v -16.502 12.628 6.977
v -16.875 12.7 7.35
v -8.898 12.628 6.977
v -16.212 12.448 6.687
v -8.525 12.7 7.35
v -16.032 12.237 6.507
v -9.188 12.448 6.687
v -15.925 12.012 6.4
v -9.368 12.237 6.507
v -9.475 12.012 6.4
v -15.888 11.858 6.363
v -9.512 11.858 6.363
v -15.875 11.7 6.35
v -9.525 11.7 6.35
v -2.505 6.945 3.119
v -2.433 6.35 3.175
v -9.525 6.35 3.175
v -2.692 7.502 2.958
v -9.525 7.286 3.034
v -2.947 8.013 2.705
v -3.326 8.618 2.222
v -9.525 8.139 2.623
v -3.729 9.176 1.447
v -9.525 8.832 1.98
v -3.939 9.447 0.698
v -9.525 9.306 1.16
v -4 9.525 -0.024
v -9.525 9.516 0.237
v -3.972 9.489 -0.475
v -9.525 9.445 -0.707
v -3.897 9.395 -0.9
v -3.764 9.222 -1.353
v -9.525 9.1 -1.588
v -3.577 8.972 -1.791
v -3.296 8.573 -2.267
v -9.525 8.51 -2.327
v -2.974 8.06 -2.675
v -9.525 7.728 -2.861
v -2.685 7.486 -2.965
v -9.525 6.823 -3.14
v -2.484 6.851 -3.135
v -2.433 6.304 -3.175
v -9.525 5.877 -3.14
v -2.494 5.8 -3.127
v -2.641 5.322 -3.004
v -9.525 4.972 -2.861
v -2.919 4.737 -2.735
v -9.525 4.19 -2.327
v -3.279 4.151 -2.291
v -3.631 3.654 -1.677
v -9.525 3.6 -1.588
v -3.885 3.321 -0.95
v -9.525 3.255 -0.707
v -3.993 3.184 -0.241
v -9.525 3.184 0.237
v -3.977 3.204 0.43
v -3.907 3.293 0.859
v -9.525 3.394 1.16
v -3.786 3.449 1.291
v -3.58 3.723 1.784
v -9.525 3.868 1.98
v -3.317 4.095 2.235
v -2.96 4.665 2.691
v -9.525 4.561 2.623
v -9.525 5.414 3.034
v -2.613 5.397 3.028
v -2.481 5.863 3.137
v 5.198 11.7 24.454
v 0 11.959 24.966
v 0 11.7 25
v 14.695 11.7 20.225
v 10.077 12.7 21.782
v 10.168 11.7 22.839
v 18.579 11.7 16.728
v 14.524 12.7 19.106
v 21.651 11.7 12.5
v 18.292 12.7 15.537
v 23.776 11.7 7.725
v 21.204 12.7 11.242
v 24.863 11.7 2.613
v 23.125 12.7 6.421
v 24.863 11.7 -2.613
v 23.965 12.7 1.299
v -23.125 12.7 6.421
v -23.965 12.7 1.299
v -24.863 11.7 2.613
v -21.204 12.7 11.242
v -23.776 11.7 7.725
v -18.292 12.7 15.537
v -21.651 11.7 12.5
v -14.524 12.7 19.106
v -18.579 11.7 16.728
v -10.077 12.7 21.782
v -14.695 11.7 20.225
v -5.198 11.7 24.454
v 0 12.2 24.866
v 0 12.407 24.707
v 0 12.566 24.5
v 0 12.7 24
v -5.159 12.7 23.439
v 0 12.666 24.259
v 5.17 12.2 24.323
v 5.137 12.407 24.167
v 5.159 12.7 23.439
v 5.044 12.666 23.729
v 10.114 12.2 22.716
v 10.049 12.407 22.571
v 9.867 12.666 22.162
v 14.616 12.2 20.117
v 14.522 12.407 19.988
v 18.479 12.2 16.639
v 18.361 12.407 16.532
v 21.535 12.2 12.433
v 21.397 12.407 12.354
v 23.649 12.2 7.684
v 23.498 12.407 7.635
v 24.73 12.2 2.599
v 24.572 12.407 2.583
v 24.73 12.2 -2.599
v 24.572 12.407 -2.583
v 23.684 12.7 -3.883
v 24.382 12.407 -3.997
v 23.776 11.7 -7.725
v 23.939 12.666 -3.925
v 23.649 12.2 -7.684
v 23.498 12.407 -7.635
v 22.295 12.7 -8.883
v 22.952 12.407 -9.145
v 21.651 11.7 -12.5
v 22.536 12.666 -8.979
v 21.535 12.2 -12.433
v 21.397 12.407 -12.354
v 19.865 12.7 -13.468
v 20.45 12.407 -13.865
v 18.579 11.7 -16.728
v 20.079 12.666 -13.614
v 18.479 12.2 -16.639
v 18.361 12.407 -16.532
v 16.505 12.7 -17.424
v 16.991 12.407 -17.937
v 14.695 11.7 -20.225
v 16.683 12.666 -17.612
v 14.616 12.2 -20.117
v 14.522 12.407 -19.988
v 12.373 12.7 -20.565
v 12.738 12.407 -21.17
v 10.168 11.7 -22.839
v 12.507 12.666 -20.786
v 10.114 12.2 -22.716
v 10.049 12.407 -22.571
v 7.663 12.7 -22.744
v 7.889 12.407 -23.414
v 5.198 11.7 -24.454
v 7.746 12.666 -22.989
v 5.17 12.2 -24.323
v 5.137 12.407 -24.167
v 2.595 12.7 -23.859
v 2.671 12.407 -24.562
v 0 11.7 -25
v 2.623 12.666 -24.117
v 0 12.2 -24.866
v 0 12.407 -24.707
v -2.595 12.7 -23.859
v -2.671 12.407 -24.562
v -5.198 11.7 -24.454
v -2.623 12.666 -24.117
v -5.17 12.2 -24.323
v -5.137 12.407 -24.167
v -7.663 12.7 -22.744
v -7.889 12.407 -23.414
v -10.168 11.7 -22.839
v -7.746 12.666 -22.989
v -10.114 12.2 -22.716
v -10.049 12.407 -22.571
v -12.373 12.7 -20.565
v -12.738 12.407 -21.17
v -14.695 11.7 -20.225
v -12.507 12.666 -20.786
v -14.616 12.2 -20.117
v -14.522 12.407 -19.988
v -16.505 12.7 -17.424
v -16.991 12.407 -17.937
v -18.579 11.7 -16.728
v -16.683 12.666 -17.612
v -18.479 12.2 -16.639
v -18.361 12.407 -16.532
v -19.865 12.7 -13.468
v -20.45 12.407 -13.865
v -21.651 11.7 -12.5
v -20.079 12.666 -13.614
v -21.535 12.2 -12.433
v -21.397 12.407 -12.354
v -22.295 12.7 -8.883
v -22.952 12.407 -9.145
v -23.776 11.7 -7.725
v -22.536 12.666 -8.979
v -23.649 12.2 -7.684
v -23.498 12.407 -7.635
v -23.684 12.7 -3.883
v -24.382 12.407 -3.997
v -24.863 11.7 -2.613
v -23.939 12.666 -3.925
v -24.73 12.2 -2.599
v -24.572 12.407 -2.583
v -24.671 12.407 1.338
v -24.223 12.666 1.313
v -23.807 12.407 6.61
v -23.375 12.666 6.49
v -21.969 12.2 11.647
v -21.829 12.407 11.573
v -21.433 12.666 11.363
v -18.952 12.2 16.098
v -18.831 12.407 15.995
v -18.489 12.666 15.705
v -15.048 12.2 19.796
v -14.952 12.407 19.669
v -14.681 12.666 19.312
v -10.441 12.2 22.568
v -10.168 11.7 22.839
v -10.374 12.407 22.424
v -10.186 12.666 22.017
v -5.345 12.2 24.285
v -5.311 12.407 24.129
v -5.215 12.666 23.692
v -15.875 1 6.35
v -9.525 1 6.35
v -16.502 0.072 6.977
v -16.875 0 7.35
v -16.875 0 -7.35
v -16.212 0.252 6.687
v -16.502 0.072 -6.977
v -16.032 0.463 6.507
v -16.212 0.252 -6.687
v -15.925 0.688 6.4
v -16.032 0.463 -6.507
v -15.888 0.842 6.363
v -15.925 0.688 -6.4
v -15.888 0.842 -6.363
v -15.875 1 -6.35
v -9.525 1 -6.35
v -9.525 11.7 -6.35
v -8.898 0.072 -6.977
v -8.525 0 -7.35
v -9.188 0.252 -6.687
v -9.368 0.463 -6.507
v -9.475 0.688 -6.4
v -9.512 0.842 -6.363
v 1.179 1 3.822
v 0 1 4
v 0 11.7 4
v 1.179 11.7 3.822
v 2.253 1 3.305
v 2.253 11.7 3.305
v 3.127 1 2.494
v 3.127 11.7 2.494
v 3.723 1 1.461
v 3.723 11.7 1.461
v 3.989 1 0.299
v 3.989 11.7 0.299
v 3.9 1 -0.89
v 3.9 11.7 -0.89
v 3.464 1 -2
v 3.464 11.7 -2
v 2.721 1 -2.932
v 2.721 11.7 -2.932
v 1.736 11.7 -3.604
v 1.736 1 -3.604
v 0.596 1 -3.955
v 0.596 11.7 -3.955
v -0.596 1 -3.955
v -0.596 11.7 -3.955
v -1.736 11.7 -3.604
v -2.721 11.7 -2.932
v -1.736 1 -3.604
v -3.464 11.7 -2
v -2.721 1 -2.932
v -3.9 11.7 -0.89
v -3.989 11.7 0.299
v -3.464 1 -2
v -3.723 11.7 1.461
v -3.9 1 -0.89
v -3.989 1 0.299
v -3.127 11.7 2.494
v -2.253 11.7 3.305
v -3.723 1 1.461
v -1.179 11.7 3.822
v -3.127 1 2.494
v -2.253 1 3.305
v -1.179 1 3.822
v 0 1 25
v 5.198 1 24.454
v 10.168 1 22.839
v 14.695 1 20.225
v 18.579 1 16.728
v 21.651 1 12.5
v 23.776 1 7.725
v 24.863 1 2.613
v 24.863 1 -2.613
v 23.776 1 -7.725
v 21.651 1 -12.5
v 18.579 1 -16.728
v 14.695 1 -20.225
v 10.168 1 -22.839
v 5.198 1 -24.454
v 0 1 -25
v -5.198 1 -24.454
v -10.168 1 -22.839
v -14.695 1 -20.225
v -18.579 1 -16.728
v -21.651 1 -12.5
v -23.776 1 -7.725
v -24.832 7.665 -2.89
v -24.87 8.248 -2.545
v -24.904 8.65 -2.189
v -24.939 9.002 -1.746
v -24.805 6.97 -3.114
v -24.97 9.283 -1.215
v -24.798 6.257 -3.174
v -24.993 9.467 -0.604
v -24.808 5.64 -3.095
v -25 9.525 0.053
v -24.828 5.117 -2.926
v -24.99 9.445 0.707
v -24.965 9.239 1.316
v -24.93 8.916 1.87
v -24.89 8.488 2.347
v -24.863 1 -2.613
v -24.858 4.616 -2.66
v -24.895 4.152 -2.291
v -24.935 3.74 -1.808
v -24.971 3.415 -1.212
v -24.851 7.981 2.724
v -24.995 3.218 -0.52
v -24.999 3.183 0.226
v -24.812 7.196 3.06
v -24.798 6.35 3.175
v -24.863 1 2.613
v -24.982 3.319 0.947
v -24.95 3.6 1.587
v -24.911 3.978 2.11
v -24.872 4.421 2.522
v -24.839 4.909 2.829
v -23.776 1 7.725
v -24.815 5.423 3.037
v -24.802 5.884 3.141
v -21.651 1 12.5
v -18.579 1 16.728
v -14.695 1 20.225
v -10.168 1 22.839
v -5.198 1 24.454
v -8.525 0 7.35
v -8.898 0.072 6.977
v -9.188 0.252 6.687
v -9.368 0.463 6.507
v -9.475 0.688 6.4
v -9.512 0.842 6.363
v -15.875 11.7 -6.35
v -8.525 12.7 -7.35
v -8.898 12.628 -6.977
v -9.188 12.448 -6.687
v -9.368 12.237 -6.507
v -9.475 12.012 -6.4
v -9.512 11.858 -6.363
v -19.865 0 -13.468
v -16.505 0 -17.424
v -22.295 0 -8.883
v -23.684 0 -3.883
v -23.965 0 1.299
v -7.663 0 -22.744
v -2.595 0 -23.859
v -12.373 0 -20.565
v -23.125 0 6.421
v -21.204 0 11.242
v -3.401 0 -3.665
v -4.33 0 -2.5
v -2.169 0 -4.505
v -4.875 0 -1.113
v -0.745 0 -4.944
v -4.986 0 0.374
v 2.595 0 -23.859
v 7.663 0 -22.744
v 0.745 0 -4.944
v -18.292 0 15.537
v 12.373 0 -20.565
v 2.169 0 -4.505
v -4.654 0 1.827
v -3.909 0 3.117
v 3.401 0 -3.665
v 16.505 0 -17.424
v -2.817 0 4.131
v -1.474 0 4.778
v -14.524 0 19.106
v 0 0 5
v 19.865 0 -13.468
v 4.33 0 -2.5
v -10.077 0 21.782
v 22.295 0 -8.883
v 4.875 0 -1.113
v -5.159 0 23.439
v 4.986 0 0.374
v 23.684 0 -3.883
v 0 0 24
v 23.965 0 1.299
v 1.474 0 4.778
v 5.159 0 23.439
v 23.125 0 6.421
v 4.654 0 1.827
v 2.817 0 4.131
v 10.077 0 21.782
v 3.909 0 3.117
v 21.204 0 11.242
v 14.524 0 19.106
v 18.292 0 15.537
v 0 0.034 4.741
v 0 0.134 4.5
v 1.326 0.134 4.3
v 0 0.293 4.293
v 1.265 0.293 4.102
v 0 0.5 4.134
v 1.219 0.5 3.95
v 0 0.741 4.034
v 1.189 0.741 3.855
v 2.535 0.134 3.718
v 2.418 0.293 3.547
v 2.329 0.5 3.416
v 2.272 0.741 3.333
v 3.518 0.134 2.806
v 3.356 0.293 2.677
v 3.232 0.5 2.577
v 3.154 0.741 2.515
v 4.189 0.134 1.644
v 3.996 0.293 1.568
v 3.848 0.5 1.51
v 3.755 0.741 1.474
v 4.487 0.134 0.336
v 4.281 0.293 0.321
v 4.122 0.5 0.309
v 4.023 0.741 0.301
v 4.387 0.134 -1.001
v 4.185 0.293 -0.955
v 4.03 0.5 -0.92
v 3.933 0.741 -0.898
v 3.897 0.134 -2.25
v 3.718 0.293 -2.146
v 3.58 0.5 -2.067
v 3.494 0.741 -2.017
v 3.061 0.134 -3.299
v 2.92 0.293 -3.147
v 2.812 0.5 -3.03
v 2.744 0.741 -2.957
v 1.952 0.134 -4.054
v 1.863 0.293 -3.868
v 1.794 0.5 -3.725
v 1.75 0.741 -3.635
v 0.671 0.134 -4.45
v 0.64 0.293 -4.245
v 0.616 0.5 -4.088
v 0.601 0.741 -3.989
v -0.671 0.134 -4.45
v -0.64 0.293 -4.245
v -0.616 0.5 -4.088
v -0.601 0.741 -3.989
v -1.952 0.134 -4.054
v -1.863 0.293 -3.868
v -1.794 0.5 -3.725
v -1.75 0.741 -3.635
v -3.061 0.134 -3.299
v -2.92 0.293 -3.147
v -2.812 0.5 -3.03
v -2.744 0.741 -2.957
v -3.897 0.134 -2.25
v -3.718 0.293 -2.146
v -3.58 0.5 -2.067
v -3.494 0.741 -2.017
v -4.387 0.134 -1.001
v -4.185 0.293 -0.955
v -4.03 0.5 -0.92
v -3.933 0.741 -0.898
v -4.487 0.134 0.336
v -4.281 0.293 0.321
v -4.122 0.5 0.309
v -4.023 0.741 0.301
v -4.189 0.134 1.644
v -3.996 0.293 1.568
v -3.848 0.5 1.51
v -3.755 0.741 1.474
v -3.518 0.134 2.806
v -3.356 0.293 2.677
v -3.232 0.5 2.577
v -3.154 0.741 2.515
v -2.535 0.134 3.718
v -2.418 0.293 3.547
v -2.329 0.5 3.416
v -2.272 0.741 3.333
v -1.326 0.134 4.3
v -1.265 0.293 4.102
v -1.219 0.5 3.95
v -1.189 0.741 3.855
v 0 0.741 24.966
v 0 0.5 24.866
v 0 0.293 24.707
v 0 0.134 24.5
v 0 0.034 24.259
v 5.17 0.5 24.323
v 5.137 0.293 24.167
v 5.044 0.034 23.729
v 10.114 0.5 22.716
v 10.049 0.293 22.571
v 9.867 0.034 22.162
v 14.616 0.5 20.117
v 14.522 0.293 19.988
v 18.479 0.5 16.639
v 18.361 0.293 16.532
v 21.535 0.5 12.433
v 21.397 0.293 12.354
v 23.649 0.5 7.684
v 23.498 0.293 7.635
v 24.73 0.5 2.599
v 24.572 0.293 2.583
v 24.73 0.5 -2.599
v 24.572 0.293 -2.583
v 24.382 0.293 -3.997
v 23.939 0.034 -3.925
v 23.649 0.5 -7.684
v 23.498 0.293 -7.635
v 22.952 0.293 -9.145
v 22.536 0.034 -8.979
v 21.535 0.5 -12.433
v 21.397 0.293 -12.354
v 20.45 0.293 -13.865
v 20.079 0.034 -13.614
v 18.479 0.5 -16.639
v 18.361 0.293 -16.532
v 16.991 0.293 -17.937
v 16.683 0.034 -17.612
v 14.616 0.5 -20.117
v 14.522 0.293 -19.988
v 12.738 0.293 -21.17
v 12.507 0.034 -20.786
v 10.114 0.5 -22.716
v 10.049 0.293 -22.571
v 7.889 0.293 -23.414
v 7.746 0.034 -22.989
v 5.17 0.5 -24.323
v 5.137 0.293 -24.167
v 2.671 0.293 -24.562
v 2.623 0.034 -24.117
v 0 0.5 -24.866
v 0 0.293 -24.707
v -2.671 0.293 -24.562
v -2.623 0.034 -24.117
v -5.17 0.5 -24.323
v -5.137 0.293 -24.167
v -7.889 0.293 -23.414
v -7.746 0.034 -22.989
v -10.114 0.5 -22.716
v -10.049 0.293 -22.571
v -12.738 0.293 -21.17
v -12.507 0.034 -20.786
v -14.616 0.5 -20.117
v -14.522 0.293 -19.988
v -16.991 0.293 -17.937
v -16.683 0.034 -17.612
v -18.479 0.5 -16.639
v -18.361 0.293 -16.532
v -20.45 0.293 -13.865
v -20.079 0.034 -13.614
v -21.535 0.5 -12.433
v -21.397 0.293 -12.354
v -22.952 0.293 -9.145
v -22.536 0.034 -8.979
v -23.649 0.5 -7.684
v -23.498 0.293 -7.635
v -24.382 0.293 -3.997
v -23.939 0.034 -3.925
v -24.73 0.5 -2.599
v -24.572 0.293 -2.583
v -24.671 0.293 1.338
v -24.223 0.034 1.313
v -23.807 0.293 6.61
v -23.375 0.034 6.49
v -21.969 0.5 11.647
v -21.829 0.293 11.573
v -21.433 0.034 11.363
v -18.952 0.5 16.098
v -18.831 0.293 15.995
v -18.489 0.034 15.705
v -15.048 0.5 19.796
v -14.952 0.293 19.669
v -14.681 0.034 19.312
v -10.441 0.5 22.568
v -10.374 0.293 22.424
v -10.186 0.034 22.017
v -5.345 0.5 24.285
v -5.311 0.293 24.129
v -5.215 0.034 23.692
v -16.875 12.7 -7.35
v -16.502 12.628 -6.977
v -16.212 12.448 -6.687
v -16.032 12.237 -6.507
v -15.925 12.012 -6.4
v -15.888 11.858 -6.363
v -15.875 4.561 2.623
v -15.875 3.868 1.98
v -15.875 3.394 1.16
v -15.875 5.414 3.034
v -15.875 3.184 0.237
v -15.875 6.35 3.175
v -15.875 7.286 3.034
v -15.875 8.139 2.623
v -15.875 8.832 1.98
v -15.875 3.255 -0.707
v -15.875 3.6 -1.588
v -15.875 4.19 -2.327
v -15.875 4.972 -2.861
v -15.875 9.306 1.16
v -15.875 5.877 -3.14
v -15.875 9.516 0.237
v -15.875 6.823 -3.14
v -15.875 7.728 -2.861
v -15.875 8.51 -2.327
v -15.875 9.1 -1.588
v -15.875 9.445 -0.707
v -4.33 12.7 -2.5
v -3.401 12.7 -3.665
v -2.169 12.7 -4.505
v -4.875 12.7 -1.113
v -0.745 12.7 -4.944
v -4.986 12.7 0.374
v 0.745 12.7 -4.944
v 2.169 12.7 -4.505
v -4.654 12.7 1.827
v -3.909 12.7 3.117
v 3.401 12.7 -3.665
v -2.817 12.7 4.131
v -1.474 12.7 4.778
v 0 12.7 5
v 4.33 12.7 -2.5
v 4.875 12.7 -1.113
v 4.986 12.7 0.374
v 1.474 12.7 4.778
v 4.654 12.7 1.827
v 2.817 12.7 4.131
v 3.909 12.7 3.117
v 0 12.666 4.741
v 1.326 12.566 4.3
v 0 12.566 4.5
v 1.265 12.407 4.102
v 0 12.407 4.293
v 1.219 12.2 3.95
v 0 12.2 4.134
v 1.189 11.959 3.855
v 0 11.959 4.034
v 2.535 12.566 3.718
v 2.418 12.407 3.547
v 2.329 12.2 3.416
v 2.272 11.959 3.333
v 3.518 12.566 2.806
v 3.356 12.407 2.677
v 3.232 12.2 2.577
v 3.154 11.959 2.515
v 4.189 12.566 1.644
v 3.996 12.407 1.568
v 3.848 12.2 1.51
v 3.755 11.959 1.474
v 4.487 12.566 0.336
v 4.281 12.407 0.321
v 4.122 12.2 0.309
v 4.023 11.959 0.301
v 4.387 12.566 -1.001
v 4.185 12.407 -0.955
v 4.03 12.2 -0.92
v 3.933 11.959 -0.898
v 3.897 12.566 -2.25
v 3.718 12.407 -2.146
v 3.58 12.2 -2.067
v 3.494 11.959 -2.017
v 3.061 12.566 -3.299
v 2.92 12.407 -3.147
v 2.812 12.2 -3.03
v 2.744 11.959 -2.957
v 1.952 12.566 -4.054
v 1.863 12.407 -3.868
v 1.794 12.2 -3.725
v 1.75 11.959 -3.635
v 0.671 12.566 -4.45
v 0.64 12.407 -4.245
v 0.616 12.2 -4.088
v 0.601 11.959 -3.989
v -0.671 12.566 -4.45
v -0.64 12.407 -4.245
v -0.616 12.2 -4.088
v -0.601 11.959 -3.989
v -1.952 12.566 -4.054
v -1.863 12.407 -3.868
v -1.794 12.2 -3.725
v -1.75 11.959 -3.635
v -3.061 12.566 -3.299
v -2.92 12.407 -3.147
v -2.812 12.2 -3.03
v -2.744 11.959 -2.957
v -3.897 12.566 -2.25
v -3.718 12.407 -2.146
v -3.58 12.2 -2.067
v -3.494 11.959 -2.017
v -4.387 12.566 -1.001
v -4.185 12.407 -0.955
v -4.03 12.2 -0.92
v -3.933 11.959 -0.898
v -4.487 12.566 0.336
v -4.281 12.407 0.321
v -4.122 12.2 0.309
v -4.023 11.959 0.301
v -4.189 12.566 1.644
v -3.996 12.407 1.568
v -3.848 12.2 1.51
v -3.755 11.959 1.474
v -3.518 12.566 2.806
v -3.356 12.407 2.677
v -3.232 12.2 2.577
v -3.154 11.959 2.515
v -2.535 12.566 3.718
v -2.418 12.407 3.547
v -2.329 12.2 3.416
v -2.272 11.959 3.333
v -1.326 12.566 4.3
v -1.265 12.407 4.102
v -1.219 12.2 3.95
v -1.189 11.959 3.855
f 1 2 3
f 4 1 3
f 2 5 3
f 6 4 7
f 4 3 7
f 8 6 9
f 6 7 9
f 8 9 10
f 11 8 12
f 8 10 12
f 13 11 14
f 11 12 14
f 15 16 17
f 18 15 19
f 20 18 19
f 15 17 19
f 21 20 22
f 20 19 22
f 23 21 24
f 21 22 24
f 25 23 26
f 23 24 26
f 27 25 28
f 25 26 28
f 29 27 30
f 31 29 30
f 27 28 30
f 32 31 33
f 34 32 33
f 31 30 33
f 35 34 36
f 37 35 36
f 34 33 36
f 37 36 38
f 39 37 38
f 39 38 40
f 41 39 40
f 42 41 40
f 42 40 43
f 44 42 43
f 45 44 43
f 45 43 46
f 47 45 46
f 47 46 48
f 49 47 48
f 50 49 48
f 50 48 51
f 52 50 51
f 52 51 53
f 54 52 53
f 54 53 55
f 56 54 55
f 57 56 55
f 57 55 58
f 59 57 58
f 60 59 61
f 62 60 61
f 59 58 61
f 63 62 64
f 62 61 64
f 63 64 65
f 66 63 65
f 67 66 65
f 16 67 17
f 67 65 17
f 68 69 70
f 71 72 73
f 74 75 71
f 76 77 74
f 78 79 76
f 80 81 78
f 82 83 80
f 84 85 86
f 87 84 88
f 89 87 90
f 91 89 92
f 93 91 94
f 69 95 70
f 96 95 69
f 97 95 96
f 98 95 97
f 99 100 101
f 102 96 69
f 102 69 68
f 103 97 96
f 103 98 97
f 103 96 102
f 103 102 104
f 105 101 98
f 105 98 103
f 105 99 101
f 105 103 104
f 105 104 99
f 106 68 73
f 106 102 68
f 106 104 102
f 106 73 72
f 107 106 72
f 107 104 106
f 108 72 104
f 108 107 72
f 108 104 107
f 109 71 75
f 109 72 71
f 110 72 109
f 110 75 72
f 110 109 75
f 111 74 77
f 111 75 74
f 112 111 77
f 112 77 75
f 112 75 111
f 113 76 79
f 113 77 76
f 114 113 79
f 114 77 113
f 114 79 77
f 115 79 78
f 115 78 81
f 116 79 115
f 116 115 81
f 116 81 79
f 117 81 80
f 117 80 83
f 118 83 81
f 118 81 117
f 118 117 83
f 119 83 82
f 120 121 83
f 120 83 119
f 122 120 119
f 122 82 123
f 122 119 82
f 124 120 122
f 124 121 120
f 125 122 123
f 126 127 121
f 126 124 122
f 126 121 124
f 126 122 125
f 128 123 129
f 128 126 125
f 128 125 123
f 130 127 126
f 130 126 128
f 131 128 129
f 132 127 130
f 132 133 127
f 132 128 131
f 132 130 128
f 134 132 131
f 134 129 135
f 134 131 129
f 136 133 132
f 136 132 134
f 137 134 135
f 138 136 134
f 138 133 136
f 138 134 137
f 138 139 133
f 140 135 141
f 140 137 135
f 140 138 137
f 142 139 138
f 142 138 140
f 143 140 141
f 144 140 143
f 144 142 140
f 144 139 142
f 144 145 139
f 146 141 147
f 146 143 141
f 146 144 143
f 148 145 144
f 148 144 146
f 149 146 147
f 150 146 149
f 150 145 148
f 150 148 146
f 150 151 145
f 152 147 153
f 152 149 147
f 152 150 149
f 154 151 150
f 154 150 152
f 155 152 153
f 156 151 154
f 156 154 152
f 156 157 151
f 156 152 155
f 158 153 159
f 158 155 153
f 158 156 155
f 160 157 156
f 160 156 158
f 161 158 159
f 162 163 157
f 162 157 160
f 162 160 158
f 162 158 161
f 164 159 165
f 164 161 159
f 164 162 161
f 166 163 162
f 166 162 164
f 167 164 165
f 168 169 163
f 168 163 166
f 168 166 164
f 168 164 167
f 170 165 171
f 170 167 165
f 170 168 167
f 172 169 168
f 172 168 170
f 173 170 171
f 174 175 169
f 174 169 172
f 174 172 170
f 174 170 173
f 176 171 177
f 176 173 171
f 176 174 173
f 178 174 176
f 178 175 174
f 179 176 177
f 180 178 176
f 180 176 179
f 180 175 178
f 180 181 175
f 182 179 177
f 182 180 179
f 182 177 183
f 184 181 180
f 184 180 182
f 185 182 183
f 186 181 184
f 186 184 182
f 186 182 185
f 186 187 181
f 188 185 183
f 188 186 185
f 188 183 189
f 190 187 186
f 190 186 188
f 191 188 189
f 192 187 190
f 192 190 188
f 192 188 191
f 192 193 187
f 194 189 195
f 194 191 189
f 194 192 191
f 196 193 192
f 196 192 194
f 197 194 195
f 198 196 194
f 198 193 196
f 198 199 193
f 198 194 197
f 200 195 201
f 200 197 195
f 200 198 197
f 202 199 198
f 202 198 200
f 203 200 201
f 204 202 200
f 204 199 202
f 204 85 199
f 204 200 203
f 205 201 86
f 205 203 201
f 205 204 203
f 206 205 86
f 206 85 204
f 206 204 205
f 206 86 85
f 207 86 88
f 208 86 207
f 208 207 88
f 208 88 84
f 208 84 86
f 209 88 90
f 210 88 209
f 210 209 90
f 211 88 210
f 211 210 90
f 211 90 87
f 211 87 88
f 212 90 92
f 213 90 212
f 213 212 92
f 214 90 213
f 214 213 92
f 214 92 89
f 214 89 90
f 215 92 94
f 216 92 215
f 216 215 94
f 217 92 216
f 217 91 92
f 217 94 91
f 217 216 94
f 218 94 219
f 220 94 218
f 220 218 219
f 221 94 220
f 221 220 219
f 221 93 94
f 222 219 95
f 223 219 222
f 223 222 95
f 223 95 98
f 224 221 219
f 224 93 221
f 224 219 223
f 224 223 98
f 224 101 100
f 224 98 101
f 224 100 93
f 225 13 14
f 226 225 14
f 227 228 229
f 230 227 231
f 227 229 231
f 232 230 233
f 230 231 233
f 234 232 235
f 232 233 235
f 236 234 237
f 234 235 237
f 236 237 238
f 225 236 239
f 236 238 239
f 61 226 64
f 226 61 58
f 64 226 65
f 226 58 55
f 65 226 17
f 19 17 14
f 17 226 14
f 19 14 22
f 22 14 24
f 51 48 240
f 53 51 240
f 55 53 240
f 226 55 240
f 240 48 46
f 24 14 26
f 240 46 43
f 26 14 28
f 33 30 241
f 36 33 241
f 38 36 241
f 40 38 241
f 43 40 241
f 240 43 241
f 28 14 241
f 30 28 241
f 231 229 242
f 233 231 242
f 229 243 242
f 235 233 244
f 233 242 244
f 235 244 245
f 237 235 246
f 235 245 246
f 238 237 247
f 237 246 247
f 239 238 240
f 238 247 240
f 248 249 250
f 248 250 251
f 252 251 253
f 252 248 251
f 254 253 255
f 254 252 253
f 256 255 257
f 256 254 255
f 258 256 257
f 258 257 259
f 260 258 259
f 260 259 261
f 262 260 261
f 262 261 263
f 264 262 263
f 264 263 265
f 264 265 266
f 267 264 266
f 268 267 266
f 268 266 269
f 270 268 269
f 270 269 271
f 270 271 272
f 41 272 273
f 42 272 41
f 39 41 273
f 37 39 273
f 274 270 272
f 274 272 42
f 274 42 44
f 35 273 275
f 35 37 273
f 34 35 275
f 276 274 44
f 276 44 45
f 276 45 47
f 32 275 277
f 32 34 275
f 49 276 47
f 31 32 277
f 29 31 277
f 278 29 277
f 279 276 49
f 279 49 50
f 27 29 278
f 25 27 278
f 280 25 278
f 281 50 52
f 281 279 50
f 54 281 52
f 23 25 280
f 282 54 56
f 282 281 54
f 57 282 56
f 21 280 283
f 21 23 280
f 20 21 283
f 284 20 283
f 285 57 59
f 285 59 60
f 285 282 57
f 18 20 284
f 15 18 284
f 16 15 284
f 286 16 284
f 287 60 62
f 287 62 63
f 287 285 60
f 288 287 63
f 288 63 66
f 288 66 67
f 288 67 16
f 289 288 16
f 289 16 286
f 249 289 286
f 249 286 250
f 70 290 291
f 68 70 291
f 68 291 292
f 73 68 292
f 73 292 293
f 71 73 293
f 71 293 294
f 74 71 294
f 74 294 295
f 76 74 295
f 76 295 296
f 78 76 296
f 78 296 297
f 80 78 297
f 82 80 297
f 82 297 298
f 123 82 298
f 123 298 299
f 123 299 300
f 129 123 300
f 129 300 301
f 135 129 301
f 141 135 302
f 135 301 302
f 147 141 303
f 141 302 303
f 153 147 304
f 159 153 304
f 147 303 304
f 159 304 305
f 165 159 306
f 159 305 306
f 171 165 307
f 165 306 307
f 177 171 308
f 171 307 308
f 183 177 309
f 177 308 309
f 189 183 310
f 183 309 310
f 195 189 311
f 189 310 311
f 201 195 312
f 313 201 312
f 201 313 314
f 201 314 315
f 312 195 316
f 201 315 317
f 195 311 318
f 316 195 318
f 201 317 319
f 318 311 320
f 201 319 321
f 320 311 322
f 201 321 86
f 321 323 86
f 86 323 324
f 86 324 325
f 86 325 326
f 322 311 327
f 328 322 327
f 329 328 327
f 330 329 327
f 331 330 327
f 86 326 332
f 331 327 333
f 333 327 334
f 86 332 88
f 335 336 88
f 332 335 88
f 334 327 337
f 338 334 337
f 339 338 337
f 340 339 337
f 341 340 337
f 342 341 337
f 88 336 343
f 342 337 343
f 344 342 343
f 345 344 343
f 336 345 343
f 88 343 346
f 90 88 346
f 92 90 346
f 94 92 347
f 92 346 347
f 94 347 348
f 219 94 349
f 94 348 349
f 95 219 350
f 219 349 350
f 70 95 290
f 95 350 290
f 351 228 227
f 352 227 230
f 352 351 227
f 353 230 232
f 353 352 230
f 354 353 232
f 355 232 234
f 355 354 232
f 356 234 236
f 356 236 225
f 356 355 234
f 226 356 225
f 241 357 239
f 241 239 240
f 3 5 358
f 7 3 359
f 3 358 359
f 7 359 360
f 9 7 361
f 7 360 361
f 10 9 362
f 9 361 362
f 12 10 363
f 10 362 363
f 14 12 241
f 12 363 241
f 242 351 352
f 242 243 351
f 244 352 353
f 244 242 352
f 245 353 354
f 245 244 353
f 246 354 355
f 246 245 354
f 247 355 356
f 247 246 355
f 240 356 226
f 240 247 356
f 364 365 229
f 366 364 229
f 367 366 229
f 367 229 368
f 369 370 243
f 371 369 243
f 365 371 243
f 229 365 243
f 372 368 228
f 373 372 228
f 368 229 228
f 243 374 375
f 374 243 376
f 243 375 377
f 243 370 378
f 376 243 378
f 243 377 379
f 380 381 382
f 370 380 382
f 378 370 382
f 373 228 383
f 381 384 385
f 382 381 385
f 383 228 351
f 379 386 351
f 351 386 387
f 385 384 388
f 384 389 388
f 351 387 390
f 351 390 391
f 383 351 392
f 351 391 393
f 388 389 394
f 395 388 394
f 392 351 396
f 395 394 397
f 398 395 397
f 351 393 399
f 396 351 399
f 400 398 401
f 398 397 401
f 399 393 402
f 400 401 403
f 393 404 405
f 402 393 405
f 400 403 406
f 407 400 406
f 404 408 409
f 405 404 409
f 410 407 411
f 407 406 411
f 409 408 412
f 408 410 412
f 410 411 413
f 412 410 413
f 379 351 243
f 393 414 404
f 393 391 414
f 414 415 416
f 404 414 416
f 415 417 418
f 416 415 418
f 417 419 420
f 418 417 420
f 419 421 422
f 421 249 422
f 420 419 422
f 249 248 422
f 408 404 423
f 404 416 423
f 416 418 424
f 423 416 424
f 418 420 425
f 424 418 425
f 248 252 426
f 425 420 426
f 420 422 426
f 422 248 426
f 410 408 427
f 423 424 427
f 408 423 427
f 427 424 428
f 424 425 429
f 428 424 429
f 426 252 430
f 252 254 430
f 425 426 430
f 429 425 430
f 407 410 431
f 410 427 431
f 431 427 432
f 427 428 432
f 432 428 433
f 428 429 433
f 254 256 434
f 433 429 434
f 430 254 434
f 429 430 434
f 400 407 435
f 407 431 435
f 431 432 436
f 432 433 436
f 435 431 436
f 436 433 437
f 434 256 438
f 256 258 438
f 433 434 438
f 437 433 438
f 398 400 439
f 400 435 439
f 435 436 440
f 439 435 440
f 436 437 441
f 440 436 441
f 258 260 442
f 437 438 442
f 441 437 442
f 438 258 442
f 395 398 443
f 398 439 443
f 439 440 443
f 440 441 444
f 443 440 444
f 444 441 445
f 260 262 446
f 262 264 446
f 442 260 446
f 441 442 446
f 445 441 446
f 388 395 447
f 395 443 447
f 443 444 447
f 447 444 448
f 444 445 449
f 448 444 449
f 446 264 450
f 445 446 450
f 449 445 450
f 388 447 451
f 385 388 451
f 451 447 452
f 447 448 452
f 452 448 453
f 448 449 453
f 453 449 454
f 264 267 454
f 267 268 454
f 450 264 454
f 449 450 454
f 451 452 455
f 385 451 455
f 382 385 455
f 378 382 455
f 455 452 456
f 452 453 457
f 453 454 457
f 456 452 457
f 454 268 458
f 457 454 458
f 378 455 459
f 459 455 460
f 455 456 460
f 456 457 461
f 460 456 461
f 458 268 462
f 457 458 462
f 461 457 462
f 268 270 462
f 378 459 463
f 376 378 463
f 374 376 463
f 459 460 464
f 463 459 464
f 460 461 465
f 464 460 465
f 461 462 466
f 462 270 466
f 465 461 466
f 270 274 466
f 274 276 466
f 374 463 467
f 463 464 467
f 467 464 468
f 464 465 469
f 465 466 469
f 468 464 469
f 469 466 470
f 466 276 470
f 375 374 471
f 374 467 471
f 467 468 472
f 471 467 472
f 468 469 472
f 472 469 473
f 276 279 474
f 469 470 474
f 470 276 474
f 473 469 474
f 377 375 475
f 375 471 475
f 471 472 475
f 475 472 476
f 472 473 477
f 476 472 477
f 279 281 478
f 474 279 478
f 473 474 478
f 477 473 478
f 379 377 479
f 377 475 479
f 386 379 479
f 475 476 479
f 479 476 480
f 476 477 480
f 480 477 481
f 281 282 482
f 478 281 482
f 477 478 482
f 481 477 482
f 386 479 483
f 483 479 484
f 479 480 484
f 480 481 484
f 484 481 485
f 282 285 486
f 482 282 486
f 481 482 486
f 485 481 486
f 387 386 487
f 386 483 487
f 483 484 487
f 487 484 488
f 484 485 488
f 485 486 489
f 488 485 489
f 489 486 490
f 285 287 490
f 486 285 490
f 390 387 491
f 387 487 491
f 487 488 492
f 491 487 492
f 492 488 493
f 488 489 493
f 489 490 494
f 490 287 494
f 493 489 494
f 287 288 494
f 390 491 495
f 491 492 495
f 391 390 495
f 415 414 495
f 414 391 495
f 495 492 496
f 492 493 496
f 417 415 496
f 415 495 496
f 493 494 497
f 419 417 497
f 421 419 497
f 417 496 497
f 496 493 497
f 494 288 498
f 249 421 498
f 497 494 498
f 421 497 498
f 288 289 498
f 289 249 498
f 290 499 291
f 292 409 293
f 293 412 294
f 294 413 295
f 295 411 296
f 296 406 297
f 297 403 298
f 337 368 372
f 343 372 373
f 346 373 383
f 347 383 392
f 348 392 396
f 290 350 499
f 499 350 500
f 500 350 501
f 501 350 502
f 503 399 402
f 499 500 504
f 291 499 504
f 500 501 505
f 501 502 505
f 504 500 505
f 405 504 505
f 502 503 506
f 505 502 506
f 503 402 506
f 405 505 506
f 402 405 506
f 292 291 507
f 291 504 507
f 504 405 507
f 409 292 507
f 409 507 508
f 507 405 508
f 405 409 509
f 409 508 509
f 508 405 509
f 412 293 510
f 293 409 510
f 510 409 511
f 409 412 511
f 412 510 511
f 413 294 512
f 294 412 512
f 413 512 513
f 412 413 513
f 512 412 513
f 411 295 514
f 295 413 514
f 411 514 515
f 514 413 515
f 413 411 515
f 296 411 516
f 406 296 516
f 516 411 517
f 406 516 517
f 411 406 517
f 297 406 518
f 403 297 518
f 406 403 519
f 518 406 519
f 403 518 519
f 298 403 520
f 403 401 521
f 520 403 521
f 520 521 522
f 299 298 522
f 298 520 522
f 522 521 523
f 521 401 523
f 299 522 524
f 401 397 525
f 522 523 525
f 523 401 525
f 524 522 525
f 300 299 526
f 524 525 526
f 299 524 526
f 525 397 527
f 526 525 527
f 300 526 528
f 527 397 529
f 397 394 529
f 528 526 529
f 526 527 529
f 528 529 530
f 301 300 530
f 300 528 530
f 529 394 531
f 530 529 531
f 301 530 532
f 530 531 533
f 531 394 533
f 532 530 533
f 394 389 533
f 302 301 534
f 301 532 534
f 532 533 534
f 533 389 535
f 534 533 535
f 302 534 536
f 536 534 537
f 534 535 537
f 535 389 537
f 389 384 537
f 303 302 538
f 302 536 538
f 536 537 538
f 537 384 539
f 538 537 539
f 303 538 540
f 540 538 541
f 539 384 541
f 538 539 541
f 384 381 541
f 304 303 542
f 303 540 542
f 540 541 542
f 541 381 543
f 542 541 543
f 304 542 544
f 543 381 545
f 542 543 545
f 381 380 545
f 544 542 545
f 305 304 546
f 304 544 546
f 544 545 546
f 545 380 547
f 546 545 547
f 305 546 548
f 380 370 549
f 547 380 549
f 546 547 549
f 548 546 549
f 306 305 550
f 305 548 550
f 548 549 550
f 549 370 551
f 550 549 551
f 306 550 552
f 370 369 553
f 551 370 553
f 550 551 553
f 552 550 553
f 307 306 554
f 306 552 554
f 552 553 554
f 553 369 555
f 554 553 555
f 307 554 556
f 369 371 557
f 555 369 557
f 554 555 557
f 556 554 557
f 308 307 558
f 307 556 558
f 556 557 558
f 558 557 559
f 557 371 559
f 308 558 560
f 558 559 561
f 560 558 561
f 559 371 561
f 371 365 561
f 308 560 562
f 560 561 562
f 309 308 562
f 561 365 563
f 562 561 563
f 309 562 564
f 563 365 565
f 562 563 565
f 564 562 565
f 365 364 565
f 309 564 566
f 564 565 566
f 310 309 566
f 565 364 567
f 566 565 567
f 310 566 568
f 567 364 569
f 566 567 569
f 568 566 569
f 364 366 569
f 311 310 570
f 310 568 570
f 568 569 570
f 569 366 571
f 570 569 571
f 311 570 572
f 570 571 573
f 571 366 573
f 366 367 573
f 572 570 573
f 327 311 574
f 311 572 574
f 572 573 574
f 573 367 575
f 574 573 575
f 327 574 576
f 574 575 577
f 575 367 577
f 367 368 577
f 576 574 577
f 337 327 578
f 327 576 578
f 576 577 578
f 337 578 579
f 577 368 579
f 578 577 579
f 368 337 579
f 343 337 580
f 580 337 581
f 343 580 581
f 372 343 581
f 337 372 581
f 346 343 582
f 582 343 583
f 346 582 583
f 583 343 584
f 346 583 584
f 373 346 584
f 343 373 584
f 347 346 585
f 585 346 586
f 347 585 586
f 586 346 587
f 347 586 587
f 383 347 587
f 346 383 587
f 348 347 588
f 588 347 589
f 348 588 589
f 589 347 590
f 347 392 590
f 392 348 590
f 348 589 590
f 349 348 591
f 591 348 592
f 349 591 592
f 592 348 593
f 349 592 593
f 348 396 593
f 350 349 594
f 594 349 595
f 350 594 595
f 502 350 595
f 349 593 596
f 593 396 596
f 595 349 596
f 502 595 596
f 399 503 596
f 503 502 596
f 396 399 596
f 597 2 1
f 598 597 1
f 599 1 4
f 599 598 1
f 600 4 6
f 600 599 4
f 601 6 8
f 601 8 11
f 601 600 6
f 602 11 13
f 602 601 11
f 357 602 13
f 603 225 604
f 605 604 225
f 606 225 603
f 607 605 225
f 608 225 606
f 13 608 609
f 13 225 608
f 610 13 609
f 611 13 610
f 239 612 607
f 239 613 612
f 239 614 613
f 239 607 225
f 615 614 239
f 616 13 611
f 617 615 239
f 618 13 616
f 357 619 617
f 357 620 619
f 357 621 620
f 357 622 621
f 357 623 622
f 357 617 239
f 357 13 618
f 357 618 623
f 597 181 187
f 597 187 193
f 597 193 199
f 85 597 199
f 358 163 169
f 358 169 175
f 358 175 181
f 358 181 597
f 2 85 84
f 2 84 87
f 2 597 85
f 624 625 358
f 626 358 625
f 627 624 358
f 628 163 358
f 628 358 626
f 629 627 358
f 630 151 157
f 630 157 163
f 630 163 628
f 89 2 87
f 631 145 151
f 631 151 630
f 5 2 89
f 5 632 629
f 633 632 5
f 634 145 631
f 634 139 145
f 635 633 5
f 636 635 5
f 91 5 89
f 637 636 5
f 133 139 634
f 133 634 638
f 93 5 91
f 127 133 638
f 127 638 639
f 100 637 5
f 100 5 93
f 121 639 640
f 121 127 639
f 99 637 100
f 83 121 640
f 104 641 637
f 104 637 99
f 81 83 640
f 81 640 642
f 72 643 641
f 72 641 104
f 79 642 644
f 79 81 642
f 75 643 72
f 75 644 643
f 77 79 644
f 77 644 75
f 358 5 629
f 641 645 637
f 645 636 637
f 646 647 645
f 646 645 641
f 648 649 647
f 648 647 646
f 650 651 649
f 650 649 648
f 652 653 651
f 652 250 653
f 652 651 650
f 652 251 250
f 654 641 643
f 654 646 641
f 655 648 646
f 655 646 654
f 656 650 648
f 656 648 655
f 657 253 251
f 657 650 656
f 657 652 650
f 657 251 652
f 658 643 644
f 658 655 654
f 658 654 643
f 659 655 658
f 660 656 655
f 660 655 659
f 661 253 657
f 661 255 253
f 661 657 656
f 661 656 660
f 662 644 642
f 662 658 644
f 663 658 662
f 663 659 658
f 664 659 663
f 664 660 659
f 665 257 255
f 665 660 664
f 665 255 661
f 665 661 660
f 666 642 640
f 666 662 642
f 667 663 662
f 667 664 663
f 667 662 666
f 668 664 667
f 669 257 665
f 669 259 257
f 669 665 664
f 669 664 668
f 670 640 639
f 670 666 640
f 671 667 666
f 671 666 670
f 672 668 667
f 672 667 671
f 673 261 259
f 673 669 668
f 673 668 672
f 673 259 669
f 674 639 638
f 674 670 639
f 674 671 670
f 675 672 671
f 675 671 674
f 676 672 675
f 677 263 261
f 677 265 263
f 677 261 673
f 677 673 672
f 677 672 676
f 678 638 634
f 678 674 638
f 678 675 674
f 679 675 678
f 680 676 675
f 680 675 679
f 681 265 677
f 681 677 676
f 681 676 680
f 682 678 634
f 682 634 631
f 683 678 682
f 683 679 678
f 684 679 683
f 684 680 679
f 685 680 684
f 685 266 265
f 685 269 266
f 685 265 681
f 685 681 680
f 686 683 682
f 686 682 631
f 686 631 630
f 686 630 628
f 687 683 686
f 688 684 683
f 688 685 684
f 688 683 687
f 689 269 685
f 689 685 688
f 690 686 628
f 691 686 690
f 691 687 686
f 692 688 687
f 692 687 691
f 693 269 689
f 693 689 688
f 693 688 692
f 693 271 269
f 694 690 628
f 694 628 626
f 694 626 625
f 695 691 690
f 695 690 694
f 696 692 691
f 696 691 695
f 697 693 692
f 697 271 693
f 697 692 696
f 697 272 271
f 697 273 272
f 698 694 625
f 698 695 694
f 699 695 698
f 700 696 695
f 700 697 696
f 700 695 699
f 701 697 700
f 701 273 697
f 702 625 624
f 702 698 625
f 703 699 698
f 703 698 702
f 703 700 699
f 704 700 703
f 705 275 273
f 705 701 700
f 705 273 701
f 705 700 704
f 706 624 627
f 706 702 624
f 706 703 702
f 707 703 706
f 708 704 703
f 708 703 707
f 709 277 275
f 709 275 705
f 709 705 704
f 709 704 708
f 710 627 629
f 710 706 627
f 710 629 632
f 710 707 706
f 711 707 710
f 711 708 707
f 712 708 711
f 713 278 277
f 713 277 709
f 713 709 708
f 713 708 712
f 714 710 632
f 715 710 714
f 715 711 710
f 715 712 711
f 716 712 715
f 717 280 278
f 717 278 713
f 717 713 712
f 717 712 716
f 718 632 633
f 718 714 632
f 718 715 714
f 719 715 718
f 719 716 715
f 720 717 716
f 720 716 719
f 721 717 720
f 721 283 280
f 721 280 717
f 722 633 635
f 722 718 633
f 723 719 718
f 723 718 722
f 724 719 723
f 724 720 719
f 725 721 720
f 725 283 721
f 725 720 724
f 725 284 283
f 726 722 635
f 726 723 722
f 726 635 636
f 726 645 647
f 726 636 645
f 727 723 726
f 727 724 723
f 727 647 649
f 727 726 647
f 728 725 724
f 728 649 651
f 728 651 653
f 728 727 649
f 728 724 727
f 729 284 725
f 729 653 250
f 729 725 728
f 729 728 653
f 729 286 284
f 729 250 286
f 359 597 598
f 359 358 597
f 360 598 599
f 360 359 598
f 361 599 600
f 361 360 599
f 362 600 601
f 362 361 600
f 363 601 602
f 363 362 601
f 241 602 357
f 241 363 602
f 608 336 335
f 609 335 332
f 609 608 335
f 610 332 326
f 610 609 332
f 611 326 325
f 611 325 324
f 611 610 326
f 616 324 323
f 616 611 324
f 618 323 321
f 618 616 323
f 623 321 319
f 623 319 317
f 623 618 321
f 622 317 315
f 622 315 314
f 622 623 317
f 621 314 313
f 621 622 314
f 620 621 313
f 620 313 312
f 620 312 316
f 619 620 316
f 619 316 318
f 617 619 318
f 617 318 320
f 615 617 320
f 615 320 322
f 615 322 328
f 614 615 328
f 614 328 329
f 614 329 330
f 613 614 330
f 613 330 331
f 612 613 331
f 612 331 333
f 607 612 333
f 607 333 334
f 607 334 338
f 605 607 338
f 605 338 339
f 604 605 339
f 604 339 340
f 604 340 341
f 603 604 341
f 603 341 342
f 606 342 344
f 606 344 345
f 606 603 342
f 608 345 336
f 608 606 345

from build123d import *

# Parameters (mm, degrees)
SKETCH1_R                      = 25
SKETCH1_R_2                    = 4
BOSS_EXTRUDE1_DEPTH            = 12.7
SKETCH2_W                      = 6.35
SKETCH2_H                      = 12.7
CUT_EXTRUDE1_DEPTH             = 38.567139896
SKETCH3_R                      = 3.175
CUT_EXTRUDE2_DEPTH             = 45.477698063
CUT_EXTRUDE2_DIRECTION_2_REACH = 46.478
FILLET1_R                      = 1


with BuildPart() as part:
    # Sketch1 → Boss-Extrude1 (new body)
    with BuildSketch(Plane(origin=(0, 0, 0), x_dir=(1, 0, 0), z_dir=(0, 1, 0))):
        with Locations(Location((0, 0, 0), (0, 0, 270))):
            Circle(SKETCH1_R)
        with Locations(Location((0, 0, 0), (0, 0, 270))):
            Circle(SKETCH1_R_2, mode=Mode.SUBTRACT)
    extrude(amount=BOSS_EXTRUDE1_DEPTH)

    # Sketch2 → Cut-Extrude1 (cut, through all)
    with BuildSketch(Plane(origin=(0, 12.7, 0), x_dir=(1, 0, 0), z_dir=(0, 1, 0))):
        with Locations((-12.7, 0)):
            Rectangle(SKETCH2_W, SKETCH2_H)
    extrude(amount=-CUT_EXTRUDE1_DEPTH, mode=Mode.SUBTRACT)

    # Sketch3 → Cut-Extrude2 (cut)
    with BuildSketch(Plane.ZY.offset(9.525)):
        with Locations((0, 6.35)):
            Circle(SKETCH3_R)
    extrude(amount=CUT_EXTRUDE2_DEPTH, mode=Mode.SUBTRACT)

    # Sketch3 → Cut-Extrude2 direction 2 (cut, up to next)
    with BuildSketch(Plane.ZY.offset(9.525), mode=Mode.PRIVATE) as cut_extrude2_direction_2_sk1:
        with Locations((0, 6.35)):
            Circle(SKETCH3_R)
    cut_extrude2_direction_2_tool1 = extrude(cut_extrude2_direction_2_sk1.sketch, amount=-CUT_EXTRUDE2_DIRECTION_2_REACH, mode=Mode.PRIVATE) & part.part
    add(cut_extrude2_direction_2_tool1.solids().sort_by_distance((-9.525, 6.35, 0))[0], mode=Mode.SUBTRACT)

    # Fillet1
    fillet1_edges = [part.edges().sort_by_distance(p)[0] for p in [
        (-15.875, 0, 0),
        (-12.7, 0, -6.35),
        (-9.525, 0, 0),
        (-12.7, 0, 6.35),
        (-15.875, 12.7, 0),
        (-12.7, 12.7, 6.35),
        (-9.525, 12.7, 0),
        (-12.7, 12.7, -6.35),
        (0, 0, -25),
        (0, 12.7, -25),
        (0, 0, -4),
        (0, 12.7, -4),
    ]]
    fillet(fillet1_edges, radius=FILLET1_R)


solid = part.part
